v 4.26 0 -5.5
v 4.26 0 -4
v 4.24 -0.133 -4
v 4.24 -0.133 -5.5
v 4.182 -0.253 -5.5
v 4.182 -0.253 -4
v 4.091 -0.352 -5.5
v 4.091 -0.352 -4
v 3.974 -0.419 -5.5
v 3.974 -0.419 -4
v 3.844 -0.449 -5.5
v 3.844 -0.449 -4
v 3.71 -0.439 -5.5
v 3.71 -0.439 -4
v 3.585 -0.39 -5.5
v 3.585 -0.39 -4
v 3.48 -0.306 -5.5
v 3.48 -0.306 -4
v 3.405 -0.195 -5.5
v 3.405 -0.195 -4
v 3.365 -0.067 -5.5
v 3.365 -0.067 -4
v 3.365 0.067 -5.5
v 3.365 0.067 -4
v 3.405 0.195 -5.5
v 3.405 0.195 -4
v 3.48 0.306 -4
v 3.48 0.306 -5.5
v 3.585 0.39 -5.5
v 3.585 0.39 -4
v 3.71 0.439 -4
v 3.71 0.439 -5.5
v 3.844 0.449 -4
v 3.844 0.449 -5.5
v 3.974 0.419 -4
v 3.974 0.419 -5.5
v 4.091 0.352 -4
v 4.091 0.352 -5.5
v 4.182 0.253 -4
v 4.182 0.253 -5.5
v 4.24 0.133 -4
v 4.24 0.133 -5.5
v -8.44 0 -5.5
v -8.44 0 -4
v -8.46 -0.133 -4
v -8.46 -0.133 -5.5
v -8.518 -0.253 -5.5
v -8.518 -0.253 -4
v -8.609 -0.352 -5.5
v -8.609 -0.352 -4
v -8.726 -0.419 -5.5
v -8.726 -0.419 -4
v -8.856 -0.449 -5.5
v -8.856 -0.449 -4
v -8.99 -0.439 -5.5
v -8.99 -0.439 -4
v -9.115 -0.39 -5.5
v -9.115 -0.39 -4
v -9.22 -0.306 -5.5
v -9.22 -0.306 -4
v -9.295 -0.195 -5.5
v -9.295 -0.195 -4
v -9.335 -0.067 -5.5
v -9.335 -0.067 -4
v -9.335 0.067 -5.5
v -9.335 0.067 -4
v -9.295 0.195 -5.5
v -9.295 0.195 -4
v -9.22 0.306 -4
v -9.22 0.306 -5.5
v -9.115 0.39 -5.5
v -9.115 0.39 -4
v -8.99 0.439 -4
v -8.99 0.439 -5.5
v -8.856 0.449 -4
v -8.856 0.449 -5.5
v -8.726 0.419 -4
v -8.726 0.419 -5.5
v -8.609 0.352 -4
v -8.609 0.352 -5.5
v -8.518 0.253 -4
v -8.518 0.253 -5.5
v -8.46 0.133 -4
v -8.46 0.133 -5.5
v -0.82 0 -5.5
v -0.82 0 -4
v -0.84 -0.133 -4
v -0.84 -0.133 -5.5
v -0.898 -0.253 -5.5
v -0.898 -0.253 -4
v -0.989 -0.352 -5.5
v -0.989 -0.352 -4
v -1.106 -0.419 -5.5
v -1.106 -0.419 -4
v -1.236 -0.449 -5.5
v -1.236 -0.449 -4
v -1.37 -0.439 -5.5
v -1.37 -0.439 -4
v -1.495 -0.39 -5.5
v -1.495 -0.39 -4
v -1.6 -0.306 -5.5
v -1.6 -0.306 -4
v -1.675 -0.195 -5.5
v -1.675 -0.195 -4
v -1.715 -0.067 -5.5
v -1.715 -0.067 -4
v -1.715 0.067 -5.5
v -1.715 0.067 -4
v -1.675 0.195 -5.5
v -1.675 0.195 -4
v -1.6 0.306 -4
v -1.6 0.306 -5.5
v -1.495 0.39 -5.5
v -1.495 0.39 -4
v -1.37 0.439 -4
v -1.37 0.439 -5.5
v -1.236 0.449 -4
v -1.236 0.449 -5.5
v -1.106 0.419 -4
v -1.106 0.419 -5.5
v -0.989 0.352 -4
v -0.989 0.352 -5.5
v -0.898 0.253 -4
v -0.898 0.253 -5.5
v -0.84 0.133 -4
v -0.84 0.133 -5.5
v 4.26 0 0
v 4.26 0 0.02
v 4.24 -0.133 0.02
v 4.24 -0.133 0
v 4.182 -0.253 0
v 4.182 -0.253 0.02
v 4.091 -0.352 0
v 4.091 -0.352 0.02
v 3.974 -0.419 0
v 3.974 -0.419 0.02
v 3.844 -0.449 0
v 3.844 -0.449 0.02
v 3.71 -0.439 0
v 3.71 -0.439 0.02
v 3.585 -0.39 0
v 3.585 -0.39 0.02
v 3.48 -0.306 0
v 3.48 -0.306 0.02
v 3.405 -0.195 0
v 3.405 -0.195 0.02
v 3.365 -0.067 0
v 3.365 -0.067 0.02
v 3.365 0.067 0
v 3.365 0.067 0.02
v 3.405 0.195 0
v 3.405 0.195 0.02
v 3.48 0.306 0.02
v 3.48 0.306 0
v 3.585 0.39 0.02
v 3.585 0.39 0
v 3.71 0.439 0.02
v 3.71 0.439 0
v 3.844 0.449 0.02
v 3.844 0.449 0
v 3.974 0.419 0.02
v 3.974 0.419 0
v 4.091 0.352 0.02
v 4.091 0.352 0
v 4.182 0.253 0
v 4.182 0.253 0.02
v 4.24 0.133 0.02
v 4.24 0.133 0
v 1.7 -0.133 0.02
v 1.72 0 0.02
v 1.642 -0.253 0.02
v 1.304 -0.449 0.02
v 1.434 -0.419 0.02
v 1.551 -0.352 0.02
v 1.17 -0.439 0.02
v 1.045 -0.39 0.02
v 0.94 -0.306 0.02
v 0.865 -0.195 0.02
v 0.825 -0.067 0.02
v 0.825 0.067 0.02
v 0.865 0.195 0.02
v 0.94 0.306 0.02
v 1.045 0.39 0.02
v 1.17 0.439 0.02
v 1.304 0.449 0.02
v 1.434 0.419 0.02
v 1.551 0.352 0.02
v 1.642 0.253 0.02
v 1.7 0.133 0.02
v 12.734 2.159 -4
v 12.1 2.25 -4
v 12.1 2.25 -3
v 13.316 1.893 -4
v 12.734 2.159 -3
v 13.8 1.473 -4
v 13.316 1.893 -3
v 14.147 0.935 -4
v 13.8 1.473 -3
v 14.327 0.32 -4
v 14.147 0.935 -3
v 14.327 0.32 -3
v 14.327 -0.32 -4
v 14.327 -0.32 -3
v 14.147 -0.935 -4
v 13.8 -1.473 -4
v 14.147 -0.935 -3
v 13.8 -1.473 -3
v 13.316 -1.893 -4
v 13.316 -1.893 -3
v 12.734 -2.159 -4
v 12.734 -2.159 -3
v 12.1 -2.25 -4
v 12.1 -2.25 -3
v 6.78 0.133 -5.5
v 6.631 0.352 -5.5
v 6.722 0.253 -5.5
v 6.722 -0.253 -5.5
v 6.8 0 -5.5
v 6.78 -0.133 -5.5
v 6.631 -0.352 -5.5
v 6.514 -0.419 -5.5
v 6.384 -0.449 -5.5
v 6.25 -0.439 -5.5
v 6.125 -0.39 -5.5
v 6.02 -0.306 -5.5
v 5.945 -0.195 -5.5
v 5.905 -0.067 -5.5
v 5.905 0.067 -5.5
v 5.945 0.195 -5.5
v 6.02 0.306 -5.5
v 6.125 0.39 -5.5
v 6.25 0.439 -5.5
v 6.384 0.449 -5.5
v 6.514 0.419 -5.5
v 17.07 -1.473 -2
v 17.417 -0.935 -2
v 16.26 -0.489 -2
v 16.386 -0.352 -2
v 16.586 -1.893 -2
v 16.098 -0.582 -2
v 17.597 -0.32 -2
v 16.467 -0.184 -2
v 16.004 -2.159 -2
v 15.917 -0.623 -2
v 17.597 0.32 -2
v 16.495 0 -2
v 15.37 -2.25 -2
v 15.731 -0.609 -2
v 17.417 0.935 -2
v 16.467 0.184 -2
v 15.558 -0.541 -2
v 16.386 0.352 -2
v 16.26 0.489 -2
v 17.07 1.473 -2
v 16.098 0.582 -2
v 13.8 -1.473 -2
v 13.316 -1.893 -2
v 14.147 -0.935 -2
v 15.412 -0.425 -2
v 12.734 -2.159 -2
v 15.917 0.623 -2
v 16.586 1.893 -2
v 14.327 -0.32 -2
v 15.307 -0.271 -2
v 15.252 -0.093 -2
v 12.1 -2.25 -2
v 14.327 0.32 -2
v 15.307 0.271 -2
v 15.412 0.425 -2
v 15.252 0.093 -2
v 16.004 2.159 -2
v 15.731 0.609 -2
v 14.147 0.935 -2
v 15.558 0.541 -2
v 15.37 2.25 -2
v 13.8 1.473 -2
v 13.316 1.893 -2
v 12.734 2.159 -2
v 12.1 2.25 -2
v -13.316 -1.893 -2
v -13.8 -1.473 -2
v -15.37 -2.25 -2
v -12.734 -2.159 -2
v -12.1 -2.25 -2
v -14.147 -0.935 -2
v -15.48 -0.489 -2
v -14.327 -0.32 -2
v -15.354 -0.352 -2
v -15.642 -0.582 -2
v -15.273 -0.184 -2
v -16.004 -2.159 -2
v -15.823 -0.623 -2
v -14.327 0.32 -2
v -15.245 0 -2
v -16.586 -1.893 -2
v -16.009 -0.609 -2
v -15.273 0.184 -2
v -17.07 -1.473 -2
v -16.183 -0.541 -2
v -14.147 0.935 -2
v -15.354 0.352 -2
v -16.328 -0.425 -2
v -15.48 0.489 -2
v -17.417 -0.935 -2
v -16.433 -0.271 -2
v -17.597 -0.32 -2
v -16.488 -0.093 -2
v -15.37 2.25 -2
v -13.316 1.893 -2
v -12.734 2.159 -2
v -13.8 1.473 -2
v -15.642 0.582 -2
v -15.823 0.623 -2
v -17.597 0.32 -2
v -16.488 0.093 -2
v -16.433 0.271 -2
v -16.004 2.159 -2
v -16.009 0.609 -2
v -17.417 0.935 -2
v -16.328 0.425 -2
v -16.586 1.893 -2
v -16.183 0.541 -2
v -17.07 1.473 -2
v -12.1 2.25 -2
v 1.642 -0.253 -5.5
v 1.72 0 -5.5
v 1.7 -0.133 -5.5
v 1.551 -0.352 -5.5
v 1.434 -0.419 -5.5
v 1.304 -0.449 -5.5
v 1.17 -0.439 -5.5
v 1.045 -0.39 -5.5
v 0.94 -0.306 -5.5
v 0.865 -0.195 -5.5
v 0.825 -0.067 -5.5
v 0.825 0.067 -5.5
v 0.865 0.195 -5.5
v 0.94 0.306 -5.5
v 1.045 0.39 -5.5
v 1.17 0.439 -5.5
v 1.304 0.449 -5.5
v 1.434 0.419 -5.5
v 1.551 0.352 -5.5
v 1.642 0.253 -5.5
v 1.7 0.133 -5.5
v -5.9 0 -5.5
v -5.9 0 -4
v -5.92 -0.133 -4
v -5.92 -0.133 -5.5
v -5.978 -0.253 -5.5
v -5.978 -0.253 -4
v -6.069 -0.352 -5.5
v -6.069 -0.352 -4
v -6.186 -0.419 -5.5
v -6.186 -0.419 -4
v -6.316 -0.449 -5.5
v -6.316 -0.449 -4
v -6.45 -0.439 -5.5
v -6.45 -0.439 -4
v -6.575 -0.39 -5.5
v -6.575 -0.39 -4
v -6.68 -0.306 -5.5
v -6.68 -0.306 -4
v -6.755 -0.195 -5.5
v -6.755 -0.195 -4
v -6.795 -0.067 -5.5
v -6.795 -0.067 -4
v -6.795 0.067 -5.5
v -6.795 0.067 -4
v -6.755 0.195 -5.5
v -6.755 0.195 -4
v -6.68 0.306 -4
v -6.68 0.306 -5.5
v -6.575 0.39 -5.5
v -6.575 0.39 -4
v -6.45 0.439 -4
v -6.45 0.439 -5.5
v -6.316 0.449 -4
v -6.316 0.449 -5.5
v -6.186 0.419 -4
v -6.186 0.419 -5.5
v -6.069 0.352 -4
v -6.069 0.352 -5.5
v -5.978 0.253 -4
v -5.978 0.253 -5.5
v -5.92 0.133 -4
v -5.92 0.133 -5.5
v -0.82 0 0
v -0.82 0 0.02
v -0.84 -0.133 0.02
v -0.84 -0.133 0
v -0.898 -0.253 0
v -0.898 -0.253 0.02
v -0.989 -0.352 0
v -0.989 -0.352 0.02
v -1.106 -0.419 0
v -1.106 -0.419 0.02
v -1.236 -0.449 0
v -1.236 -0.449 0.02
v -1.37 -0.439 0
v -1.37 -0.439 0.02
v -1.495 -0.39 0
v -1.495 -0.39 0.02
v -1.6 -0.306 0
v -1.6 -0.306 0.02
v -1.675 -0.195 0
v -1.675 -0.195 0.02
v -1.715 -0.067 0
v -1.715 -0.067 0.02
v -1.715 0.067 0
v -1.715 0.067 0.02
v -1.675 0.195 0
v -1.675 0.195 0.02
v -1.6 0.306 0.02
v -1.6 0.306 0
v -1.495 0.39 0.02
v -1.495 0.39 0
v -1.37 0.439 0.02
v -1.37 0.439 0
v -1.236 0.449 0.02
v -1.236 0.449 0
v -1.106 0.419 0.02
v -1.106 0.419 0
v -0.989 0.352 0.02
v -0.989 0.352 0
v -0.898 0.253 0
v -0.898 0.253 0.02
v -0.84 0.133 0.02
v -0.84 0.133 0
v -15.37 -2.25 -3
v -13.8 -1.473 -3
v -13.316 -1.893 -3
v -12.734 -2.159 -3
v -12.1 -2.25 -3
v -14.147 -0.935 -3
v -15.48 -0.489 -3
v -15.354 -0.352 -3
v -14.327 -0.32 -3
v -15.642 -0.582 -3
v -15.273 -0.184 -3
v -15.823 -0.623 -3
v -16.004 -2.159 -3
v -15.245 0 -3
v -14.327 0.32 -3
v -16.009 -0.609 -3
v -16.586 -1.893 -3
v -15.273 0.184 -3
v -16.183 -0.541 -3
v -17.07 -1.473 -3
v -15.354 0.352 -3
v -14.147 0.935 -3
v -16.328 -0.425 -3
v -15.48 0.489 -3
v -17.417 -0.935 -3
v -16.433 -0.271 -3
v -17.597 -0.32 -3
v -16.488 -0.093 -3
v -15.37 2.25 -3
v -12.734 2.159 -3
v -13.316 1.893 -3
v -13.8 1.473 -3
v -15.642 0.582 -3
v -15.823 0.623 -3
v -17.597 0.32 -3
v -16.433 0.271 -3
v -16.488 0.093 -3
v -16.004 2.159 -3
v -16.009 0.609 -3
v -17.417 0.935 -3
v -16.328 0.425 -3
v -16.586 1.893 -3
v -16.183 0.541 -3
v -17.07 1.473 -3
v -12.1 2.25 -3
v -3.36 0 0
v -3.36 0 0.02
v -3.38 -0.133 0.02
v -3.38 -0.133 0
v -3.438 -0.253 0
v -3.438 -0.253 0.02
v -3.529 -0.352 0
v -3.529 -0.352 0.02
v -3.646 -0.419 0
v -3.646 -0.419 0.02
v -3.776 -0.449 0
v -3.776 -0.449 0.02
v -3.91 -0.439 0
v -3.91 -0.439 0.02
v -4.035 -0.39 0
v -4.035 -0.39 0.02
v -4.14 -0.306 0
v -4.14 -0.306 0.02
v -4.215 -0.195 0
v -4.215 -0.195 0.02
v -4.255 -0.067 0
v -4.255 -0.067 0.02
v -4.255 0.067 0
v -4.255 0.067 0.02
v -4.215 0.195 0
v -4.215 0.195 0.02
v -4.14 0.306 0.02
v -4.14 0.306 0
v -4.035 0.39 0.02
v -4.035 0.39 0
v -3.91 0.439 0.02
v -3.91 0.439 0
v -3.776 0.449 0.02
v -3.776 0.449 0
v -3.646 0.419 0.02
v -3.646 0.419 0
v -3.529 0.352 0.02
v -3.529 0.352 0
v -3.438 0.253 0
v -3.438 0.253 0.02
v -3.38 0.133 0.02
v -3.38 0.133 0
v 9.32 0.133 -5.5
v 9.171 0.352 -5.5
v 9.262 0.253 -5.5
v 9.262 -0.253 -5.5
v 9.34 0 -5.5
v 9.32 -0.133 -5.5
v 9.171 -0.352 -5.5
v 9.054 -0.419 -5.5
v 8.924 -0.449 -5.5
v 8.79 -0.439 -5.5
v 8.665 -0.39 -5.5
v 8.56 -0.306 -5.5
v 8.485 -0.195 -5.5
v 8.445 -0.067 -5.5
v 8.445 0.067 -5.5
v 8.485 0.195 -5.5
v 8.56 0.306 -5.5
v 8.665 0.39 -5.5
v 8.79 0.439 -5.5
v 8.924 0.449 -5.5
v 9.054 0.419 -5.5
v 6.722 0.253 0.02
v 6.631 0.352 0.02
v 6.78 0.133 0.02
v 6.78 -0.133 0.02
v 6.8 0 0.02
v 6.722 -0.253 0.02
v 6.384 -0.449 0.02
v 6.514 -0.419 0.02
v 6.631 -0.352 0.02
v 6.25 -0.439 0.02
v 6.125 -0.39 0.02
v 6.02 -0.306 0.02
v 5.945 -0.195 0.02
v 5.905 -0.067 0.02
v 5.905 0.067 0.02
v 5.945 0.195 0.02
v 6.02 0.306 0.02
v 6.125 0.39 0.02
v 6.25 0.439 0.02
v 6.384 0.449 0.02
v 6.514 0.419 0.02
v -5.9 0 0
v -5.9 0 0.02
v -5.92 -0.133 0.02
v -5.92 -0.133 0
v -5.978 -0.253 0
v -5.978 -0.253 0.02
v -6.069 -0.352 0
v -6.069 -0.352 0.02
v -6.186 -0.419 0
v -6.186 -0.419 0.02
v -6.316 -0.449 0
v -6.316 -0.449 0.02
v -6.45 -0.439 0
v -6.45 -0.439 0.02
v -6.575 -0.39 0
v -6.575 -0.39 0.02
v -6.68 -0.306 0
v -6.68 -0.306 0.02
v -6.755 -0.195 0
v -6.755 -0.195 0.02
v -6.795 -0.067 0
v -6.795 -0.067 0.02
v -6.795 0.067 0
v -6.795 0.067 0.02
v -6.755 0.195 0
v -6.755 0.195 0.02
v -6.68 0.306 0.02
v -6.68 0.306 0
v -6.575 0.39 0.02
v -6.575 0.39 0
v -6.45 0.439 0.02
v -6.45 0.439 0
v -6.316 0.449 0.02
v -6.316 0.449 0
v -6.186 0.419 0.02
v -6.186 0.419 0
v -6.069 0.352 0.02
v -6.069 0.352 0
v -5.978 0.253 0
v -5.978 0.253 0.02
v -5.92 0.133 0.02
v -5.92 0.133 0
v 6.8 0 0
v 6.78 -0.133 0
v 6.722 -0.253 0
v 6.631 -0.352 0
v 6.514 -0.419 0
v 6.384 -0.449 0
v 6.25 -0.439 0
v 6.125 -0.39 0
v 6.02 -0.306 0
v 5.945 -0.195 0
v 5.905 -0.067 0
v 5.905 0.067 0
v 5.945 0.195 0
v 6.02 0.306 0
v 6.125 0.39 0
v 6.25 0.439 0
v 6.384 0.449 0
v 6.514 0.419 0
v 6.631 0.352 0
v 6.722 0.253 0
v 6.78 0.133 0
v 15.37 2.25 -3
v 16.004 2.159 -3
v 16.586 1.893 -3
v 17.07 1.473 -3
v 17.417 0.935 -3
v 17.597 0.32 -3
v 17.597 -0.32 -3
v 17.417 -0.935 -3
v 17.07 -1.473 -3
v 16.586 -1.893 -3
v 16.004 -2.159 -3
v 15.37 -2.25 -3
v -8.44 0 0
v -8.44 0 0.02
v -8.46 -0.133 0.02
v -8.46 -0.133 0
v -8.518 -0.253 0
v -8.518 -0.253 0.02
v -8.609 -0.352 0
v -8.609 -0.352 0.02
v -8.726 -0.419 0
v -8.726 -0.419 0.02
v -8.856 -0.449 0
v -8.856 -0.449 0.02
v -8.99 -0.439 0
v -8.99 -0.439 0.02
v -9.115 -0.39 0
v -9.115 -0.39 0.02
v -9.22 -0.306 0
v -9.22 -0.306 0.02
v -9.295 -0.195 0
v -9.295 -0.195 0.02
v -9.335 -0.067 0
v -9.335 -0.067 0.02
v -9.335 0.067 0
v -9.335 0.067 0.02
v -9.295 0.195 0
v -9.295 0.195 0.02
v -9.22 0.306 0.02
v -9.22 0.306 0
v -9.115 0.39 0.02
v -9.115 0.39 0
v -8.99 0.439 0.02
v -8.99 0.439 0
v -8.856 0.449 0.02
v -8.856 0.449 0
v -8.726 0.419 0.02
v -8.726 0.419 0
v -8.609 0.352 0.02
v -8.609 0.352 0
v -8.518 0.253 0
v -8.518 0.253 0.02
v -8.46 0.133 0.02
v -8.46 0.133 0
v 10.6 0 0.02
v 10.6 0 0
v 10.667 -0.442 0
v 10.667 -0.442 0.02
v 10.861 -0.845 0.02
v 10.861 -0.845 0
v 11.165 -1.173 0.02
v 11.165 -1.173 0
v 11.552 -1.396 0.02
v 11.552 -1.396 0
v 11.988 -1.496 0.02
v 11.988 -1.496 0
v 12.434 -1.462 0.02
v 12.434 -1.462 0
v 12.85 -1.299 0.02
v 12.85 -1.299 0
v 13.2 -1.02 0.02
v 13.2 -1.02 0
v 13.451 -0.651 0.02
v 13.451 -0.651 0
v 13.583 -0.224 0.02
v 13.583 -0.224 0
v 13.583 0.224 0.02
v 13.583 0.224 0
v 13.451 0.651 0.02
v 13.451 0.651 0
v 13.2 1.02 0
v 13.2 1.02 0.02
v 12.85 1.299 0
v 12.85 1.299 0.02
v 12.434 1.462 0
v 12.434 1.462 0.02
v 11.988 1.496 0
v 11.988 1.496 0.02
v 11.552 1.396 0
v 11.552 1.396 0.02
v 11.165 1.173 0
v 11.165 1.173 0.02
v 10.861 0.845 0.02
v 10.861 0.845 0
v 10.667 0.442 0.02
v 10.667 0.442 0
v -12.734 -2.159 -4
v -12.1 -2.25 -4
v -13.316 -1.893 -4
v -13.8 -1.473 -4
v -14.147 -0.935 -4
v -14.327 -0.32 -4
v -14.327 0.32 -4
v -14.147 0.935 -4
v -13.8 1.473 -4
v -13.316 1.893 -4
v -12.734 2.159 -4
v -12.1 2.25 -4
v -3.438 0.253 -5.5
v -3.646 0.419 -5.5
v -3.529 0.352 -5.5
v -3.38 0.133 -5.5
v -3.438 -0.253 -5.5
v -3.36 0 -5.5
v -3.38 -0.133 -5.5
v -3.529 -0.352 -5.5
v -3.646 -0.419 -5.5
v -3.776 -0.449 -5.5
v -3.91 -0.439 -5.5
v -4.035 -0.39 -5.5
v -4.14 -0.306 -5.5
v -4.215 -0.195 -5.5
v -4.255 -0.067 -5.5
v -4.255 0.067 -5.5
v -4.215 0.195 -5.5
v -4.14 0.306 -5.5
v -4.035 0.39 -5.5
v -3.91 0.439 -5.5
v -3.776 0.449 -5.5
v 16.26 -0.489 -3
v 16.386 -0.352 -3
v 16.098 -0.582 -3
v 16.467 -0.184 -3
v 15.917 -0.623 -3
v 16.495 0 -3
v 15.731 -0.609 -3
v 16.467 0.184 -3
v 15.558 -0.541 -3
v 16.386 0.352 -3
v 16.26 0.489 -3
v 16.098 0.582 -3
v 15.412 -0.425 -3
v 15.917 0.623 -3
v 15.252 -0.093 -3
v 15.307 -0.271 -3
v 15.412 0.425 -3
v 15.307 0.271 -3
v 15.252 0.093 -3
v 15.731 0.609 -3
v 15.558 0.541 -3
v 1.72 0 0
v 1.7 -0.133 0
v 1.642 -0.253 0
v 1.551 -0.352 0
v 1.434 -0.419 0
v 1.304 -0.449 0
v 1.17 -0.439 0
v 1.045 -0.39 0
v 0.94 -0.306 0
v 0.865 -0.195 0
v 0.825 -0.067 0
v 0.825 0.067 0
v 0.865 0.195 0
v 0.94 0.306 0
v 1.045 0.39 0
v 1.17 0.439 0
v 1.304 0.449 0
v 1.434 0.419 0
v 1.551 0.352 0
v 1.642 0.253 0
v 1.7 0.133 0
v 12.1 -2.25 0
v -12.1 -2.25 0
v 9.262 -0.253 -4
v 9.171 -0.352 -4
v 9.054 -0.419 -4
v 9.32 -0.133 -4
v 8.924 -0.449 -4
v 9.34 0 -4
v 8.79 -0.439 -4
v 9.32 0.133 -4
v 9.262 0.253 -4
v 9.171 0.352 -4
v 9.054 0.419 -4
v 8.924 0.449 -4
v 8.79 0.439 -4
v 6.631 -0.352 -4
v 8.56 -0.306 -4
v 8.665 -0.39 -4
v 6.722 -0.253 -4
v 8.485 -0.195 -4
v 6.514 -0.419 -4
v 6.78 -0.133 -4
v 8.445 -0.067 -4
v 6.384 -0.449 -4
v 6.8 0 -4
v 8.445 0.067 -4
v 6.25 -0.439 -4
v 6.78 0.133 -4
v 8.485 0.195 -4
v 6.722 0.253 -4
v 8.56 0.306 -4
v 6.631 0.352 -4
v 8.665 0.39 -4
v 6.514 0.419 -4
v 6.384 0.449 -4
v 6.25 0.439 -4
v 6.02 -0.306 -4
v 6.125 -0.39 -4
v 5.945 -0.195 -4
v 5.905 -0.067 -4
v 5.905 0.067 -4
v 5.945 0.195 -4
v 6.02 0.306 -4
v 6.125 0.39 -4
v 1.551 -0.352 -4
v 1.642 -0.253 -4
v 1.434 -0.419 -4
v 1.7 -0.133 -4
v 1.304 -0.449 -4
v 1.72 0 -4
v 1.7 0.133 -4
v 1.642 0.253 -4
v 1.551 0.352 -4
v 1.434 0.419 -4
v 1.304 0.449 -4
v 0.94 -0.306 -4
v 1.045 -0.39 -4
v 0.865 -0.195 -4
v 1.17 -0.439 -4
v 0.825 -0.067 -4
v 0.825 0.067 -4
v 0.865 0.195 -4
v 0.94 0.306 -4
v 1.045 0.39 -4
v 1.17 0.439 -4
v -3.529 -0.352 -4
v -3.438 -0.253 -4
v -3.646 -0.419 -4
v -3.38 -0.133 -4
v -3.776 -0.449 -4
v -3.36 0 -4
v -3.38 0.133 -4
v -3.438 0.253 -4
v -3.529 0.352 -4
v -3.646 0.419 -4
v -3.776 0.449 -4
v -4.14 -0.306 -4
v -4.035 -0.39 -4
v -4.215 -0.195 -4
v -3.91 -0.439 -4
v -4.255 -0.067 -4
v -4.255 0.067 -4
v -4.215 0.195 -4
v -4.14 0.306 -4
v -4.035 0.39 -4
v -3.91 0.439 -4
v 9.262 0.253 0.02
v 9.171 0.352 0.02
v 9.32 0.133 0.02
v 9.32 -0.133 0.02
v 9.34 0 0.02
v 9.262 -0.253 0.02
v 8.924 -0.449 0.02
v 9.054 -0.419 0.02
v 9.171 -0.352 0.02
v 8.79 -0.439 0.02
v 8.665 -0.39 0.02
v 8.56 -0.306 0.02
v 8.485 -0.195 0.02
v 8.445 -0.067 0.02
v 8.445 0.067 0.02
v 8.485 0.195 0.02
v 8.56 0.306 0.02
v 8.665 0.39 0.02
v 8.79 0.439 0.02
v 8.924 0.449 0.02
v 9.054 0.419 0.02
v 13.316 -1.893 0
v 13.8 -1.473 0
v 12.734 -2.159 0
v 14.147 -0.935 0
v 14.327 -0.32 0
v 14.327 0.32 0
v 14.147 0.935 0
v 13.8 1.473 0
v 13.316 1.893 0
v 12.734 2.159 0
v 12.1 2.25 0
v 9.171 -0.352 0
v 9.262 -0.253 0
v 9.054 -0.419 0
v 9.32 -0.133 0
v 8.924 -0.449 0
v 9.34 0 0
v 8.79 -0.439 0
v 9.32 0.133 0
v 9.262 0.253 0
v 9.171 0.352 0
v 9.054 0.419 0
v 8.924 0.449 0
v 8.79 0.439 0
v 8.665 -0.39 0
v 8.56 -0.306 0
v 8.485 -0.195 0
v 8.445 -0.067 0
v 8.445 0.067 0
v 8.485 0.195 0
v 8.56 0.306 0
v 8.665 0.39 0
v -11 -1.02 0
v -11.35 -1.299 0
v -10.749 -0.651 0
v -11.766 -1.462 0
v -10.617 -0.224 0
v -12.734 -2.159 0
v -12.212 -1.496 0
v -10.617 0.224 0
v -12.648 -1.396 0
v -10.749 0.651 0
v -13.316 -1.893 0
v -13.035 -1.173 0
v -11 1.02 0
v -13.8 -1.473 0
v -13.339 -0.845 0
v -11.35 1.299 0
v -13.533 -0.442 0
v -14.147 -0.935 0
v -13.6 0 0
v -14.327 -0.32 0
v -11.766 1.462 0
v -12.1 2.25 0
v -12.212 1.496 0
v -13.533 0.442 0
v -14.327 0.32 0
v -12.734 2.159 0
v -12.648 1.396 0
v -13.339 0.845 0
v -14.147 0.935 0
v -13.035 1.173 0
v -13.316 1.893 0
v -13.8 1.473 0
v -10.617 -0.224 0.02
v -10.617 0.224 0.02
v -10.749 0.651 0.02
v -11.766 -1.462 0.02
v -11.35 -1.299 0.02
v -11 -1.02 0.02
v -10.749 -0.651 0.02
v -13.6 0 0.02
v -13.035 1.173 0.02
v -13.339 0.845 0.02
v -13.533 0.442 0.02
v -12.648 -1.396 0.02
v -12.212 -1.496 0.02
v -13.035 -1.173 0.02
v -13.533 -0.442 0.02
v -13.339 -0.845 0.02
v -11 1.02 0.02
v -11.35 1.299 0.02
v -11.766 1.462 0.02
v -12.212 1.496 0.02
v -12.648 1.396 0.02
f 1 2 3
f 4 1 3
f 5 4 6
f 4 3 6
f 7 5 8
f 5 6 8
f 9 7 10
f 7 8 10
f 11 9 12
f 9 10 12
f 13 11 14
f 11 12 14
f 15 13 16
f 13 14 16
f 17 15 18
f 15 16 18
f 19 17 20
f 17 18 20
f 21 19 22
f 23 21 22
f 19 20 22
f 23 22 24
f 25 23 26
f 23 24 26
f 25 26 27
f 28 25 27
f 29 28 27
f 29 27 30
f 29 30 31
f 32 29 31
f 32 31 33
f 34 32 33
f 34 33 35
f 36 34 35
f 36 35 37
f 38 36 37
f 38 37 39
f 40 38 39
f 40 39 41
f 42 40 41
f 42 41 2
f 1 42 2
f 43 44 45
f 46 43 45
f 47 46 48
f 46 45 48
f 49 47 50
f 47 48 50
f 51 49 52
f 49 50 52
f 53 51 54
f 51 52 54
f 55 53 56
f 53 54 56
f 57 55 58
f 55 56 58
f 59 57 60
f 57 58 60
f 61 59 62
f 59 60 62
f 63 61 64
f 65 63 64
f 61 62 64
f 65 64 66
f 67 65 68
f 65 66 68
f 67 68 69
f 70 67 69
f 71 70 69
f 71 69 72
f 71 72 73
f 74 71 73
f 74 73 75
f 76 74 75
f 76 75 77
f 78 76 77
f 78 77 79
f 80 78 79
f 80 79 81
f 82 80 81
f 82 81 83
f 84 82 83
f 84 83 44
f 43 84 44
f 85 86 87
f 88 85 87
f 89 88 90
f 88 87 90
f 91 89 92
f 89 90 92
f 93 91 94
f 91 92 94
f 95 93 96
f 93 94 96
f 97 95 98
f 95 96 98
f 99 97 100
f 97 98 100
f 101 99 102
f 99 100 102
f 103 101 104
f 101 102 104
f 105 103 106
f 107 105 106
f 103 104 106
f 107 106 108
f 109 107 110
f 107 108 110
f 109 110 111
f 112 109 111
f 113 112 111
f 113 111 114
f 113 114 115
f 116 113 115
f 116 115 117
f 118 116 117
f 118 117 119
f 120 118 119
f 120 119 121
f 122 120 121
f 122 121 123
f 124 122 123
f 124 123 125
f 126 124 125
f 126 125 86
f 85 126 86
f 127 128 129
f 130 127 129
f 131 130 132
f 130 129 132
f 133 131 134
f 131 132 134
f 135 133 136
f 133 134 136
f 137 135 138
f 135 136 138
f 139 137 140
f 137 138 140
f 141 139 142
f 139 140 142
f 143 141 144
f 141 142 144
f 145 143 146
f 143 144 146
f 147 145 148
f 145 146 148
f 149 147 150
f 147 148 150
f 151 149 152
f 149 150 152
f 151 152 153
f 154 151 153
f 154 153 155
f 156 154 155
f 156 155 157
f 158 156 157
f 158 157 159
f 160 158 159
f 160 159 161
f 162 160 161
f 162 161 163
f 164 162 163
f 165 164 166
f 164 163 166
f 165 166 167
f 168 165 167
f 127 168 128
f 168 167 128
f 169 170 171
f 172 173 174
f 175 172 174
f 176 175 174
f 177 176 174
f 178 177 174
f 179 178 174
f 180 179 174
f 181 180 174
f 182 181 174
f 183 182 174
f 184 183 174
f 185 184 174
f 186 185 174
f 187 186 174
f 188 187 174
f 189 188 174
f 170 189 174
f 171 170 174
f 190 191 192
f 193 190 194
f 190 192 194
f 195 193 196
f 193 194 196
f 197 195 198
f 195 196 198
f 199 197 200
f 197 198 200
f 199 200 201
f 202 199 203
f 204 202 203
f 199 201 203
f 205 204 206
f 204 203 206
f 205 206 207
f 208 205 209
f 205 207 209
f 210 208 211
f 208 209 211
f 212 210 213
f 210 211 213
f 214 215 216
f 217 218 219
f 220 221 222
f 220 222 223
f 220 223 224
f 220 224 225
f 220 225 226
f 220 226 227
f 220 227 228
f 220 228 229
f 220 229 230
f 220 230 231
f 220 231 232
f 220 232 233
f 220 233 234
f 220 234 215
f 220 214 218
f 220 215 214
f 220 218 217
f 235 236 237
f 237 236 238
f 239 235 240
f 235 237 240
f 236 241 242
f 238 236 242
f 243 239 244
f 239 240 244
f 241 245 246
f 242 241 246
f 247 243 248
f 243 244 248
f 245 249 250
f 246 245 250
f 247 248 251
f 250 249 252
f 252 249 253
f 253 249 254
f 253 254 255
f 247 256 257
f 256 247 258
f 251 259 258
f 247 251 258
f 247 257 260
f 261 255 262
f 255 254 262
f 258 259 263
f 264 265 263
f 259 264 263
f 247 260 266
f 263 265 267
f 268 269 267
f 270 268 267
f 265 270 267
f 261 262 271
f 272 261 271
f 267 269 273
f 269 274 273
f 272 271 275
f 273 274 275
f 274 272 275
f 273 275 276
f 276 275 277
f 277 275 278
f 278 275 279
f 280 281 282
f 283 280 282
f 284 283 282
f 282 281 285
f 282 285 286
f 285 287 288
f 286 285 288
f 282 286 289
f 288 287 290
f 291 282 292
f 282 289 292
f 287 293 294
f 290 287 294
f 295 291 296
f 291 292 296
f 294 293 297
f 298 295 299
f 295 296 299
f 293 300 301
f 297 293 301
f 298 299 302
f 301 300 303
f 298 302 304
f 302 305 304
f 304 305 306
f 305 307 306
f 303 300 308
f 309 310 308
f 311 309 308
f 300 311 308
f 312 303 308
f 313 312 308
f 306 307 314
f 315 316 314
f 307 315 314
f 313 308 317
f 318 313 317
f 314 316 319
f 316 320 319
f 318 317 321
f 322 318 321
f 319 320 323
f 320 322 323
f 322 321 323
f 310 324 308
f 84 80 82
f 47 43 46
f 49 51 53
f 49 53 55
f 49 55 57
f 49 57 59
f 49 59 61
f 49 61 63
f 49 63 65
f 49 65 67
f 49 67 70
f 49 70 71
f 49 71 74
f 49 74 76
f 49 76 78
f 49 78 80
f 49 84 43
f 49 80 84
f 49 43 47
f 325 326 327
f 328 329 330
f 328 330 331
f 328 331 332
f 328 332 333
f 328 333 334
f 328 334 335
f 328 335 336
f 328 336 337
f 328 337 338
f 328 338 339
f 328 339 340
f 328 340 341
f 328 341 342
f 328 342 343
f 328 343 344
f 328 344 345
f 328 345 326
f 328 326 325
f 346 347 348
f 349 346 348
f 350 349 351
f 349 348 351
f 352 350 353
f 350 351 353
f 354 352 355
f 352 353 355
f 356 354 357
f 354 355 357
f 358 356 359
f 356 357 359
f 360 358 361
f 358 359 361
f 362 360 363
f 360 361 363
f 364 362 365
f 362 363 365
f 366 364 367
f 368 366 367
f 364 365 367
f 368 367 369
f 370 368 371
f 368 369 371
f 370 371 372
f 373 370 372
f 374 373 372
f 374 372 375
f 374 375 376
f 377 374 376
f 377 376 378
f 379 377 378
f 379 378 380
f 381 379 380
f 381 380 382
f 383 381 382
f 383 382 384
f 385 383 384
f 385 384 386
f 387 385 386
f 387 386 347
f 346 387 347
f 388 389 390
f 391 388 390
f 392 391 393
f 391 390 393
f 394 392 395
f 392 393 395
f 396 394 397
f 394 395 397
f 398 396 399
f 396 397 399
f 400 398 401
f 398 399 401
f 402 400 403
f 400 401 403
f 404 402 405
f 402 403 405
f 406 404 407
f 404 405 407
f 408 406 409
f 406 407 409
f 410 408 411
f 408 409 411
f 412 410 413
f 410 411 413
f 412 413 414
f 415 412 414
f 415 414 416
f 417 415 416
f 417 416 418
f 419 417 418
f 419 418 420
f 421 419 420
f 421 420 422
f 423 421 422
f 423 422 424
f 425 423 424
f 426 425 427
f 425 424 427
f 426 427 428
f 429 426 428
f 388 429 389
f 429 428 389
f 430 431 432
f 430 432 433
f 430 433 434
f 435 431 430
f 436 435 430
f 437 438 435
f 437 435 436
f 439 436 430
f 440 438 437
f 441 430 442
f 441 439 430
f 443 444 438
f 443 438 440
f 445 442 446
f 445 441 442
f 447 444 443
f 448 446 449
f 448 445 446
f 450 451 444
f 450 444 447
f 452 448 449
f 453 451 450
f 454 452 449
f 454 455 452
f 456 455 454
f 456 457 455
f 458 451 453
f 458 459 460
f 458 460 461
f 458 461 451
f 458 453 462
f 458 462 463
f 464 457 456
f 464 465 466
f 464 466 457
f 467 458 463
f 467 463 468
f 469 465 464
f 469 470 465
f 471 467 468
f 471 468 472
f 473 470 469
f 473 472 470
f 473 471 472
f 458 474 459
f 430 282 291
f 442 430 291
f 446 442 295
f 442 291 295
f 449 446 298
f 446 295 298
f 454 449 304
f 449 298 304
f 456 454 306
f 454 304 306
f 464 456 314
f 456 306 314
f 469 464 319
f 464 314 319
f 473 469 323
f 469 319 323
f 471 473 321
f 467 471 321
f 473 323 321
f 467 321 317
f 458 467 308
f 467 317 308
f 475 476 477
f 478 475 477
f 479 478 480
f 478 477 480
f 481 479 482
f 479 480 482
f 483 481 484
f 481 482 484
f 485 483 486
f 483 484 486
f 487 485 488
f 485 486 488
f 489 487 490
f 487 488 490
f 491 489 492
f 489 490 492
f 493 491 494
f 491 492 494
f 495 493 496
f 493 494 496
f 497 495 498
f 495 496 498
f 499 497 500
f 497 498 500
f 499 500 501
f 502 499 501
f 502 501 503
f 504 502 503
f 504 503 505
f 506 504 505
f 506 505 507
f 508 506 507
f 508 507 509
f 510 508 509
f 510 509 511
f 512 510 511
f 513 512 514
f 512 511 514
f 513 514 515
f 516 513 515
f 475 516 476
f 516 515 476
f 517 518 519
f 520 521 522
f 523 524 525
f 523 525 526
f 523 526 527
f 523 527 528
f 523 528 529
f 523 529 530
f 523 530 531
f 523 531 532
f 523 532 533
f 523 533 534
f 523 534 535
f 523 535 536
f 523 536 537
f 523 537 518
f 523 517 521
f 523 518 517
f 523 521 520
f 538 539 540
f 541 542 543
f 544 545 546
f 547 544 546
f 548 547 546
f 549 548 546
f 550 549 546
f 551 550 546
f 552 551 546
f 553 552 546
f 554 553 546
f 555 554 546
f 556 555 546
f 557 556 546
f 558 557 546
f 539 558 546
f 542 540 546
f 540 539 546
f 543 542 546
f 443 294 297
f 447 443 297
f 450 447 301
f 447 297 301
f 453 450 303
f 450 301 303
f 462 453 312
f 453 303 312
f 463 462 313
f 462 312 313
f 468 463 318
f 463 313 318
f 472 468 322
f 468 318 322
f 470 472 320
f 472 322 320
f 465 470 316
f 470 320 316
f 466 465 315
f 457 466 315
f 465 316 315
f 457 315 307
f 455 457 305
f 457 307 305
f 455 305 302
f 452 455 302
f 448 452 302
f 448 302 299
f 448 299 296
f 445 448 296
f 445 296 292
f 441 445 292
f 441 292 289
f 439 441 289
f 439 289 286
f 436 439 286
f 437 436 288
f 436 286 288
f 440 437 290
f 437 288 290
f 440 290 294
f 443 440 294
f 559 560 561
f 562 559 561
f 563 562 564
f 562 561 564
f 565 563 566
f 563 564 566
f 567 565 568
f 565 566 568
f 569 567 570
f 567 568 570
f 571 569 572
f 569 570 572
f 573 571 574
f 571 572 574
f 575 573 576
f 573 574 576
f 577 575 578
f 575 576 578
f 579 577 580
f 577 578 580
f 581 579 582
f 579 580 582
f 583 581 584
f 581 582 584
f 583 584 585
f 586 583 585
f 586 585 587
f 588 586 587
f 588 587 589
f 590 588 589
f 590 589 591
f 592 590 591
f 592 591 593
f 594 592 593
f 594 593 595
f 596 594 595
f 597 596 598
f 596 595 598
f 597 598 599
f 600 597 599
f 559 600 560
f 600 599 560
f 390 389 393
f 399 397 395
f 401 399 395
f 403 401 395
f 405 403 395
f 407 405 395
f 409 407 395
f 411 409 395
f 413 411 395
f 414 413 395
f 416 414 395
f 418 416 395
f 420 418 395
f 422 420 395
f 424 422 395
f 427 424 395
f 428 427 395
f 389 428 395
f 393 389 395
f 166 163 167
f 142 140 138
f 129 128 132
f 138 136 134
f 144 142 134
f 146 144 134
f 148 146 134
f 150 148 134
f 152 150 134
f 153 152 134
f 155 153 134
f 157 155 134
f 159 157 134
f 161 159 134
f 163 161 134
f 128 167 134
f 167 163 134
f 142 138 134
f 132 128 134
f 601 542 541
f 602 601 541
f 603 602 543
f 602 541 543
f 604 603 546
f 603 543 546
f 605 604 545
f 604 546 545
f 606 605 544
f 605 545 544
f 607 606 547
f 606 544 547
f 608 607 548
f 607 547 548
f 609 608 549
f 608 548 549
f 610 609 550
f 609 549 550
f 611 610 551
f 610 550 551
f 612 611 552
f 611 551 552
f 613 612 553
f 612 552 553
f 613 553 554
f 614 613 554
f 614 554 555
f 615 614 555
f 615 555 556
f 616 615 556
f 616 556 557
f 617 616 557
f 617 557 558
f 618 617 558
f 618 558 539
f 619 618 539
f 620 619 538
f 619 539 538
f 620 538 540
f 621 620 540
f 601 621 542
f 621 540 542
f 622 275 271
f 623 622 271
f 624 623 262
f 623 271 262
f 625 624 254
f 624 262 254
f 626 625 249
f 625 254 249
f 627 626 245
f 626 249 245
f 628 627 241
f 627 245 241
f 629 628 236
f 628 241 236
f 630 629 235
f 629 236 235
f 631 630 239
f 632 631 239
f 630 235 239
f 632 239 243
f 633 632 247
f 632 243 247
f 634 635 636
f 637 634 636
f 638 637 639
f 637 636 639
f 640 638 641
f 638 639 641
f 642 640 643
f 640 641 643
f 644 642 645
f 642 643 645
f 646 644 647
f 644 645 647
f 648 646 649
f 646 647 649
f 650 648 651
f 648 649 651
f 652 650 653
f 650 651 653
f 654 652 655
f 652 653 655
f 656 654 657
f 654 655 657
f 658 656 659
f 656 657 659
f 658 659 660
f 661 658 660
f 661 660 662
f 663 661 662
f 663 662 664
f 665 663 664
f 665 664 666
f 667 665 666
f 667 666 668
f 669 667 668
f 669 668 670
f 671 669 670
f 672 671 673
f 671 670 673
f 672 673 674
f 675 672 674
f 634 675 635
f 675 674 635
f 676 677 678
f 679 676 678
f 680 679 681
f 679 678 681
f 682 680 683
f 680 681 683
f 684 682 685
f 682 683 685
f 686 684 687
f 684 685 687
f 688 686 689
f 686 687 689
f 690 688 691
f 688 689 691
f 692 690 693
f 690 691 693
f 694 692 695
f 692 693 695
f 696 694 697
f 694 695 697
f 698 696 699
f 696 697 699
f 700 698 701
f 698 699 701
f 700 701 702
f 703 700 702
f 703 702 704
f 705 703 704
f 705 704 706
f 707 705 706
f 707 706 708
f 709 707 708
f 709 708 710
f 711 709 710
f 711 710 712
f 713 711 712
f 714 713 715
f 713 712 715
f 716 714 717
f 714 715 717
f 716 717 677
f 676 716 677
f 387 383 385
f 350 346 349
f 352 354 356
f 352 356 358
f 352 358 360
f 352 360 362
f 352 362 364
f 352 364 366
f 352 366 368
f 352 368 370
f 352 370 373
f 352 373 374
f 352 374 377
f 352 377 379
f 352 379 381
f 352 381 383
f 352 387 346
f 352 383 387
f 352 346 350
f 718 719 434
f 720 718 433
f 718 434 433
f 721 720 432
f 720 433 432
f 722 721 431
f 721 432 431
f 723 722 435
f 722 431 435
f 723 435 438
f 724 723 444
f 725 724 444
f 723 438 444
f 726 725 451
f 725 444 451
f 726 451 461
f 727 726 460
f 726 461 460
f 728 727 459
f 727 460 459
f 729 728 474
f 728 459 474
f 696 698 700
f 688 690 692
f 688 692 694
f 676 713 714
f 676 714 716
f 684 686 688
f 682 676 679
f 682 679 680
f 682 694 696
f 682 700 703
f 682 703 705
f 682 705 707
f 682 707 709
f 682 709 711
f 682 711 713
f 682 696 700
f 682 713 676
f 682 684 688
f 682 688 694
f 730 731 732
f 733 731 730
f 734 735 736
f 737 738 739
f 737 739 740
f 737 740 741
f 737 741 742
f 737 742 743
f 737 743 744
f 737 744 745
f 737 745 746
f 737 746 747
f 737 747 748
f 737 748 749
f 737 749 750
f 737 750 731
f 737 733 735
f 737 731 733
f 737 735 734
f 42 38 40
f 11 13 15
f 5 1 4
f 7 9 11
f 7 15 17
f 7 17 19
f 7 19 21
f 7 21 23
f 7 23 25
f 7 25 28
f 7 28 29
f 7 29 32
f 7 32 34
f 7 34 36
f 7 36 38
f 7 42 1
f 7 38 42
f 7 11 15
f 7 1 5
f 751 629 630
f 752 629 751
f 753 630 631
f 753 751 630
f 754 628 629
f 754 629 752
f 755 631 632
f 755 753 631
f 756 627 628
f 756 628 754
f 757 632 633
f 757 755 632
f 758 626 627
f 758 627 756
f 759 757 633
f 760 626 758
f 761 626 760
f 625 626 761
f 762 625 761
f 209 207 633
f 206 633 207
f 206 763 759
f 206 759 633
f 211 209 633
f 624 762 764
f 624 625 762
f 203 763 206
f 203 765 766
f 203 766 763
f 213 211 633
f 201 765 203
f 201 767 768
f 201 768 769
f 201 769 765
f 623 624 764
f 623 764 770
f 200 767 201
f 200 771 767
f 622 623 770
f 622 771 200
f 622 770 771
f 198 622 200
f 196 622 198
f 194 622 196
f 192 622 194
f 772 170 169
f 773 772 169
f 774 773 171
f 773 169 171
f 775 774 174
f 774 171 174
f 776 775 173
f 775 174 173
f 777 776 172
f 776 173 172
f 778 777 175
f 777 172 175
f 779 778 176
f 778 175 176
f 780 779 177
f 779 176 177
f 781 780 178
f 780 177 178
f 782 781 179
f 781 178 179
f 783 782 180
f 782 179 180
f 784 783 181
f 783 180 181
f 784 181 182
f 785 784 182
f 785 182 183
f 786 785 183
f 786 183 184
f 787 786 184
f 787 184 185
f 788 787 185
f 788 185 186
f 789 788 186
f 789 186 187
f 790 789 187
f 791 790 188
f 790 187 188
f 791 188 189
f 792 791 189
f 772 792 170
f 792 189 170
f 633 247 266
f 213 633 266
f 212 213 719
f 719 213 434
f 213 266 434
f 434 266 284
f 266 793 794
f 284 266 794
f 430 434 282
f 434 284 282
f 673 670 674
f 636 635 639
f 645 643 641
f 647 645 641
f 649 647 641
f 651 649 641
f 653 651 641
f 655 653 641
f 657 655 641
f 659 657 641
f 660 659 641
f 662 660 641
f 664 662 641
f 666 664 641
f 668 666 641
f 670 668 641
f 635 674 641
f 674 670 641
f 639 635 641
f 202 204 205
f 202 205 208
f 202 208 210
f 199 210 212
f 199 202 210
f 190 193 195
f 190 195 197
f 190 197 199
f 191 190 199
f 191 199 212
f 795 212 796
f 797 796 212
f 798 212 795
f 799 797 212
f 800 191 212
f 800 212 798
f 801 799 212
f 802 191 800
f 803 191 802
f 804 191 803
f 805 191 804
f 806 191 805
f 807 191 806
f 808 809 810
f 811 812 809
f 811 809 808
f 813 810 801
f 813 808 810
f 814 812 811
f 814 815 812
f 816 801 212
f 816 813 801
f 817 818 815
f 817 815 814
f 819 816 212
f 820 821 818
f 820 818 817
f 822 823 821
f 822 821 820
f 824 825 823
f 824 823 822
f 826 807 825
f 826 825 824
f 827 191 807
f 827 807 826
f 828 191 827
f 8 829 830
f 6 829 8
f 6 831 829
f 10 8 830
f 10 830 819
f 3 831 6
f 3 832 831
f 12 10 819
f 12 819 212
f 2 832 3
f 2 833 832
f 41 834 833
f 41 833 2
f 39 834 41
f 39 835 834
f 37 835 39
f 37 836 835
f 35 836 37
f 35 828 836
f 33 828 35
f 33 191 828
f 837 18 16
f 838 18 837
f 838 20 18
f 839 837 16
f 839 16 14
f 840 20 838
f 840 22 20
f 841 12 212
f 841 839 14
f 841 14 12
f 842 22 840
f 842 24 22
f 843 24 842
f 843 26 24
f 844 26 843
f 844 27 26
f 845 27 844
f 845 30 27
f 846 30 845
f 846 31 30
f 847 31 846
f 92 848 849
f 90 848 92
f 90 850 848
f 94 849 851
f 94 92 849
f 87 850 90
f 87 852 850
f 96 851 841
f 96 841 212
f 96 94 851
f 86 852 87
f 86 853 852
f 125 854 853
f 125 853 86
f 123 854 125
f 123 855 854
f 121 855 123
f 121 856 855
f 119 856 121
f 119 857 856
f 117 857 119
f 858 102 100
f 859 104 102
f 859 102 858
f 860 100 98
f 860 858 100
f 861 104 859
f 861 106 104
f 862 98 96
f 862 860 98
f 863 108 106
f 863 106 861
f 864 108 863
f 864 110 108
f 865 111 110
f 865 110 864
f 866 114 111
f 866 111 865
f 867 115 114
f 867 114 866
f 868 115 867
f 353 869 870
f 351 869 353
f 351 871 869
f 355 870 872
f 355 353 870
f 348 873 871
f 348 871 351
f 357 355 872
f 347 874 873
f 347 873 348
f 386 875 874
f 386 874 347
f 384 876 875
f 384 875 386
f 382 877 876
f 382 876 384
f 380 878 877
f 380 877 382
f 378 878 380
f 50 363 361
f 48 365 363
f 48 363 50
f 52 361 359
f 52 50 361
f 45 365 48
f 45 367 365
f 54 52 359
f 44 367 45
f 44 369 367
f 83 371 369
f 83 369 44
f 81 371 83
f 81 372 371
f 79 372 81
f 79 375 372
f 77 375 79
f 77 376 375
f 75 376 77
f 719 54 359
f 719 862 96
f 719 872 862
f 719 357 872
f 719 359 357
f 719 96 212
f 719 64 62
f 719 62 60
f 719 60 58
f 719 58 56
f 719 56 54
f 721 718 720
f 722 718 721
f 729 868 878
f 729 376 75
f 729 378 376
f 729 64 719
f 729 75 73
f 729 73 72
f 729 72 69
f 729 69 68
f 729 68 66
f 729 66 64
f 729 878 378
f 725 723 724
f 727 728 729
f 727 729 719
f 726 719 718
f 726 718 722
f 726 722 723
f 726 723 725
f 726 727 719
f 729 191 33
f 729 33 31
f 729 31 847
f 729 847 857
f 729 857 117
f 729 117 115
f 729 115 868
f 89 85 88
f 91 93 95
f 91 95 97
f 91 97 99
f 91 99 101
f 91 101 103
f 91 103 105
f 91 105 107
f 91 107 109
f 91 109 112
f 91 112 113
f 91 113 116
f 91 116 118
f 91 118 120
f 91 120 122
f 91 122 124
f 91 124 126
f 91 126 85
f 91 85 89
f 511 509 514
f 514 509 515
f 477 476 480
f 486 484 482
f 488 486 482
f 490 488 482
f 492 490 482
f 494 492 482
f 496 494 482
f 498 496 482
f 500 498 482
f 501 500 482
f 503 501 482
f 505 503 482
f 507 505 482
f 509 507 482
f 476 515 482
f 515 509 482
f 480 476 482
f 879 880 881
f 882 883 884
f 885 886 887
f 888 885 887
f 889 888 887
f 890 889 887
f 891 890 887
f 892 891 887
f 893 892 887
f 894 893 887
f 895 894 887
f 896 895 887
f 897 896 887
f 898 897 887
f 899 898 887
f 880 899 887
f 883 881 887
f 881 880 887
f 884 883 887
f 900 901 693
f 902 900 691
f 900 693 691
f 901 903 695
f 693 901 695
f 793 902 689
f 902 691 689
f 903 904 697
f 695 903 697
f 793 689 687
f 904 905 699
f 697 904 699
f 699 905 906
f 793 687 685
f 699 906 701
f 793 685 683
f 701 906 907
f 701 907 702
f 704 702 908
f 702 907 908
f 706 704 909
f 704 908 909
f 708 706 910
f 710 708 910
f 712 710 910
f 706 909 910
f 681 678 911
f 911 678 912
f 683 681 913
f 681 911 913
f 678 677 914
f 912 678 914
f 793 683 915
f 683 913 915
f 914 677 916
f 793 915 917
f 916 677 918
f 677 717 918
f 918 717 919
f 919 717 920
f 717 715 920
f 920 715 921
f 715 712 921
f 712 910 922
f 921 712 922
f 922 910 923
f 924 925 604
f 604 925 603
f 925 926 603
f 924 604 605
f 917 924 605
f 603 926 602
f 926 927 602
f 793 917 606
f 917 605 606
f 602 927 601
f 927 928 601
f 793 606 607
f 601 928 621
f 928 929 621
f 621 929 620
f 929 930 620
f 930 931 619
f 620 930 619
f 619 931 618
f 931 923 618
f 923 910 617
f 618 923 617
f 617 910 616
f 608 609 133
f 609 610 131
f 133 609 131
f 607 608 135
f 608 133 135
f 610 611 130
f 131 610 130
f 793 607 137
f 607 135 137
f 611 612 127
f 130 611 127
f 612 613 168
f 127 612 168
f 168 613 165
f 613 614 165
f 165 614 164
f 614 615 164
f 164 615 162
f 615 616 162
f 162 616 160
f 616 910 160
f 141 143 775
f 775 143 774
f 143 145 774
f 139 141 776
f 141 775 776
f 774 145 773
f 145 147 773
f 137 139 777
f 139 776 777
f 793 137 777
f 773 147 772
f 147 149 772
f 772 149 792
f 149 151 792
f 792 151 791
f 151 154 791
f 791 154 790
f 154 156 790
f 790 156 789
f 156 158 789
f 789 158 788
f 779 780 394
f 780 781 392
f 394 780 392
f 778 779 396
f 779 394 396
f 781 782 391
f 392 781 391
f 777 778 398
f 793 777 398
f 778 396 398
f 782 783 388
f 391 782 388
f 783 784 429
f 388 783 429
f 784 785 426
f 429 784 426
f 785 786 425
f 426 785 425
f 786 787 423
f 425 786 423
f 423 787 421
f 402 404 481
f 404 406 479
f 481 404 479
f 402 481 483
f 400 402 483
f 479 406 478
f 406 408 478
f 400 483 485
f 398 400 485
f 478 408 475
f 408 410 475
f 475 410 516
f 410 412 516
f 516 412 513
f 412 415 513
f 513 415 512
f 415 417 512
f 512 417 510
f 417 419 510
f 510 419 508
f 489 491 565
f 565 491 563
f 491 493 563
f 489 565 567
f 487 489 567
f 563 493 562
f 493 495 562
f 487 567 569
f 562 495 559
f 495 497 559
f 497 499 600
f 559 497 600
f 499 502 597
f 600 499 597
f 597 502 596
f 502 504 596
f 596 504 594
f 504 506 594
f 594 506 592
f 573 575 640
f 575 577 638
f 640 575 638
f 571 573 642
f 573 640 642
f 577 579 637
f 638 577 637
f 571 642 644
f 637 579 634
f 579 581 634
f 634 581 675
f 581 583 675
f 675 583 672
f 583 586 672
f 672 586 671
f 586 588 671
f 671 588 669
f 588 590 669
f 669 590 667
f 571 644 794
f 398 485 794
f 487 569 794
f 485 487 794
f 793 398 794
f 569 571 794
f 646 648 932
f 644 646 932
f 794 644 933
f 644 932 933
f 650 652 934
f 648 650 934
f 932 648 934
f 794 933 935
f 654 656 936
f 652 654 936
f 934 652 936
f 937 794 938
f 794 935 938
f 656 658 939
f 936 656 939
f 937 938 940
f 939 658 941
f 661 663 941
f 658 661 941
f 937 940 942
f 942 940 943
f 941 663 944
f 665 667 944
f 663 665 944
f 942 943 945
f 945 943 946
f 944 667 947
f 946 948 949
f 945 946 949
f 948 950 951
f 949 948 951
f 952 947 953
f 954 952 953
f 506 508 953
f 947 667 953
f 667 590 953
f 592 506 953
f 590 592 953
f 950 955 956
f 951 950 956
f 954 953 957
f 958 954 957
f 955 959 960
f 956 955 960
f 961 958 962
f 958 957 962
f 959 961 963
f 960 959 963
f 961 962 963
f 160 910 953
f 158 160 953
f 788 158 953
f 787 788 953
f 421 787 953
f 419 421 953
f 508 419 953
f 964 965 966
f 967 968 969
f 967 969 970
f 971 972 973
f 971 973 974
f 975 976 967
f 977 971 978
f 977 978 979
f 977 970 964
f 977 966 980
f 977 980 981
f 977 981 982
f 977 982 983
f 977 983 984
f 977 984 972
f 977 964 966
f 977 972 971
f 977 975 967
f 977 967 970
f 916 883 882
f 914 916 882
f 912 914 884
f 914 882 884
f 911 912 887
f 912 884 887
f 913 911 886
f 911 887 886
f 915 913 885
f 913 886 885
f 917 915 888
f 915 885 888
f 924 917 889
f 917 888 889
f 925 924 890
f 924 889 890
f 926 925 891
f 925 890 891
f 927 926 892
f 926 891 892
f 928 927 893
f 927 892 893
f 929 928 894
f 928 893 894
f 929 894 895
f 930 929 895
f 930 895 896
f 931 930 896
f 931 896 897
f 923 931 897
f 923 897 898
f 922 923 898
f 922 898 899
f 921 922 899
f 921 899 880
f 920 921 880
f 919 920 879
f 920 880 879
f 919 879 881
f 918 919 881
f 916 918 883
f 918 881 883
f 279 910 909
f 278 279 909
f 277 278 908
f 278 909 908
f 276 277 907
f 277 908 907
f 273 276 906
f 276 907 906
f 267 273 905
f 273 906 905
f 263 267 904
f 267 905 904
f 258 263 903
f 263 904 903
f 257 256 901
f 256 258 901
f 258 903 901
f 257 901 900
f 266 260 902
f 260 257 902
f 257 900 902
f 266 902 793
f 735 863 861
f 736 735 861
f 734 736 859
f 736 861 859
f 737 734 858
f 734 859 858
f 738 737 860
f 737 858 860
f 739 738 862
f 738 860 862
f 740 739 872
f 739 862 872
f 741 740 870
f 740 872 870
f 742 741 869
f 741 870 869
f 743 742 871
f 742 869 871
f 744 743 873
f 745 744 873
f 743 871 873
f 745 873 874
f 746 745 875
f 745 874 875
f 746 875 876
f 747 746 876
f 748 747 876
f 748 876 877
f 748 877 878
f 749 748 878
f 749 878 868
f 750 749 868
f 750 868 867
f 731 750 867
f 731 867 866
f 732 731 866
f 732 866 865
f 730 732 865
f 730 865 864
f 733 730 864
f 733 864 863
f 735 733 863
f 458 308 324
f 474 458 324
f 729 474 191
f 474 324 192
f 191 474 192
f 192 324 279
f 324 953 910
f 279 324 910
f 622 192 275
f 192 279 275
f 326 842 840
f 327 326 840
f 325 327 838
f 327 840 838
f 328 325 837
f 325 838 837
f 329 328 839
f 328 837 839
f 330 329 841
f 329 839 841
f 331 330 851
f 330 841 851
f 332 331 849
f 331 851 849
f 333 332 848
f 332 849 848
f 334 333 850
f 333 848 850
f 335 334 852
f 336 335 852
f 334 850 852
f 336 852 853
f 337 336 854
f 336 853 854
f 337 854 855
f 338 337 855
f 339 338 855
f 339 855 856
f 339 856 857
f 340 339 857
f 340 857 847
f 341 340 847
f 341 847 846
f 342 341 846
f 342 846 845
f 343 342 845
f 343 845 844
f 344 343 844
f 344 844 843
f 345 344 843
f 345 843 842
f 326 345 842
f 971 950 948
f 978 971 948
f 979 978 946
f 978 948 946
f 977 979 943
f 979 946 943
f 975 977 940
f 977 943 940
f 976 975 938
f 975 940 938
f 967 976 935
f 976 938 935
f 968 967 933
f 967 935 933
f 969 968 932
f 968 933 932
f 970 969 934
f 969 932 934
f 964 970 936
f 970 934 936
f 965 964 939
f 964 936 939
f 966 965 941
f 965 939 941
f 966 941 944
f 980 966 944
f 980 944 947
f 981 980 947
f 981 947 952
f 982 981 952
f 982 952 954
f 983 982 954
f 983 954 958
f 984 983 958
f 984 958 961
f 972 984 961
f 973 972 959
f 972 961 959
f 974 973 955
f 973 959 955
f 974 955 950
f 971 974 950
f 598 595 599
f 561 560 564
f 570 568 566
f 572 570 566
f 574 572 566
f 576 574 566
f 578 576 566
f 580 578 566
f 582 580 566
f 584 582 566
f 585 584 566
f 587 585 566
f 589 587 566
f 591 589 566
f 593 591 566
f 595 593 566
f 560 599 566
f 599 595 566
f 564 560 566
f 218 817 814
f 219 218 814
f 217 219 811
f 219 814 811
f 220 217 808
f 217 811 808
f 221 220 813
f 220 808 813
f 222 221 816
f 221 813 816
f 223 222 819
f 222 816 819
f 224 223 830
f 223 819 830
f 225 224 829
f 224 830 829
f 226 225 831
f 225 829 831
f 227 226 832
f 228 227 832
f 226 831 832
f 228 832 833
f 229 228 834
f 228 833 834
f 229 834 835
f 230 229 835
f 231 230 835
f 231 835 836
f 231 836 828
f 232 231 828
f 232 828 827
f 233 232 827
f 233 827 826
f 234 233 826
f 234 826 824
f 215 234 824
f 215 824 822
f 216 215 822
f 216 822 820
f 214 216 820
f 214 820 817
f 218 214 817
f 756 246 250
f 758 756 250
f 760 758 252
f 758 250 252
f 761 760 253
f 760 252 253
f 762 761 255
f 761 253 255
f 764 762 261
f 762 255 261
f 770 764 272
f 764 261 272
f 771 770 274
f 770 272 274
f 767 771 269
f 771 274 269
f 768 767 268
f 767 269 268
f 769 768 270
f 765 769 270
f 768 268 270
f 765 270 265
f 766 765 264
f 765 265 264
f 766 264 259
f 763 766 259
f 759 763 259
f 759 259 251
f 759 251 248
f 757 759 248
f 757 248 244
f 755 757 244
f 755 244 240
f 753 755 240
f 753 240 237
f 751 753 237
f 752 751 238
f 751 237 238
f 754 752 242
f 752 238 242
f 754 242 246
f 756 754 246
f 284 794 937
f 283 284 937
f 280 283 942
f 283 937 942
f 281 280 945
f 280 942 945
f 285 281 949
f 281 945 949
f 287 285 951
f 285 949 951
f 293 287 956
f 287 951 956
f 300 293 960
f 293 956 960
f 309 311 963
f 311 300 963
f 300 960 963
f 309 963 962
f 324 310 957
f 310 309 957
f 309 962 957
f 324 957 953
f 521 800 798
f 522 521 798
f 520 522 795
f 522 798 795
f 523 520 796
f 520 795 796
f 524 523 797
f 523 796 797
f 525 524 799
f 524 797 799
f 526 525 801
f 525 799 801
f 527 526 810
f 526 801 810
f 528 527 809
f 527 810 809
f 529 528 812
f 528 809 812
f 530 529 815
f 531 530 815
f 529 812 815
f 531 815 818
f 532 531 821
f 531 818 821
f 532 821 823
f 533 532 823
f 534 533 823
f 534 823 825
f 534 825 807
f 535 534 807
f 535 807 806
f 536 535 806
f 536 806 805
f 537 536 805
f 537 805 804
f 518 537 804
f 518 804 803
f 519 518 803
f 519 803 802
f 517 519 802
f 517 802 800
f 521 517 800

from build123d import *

# Parameters (mm, degrees)
EXTRUDE_1_DEPTH      = 4
EXTRUDE_START        = -2
SKETCH_2_3_R         = 0.625
EXTRUDE_2_DEPTH      = 1
EXTRUDE_3_DEPTH      = 1.5
EXTRUDE_3_DEPTH_BACK = 4.02
SKETCH_4_R           = 0.45
SKETCH_5_R           = 1.5
EXTRUDE_4_DEPTH      = 0.02


with BuildPart() as part:
    # 草图2 → 凸台-拉伸1 (new body)
    with BuildSketch(Plane.XY):
        with BuildLine():
            Line((-12.1, 2.25), (12.1, 2.25))
            ThreePointArc((12.1, 2.25), (14.35, 0), (12.1, -2.25))
            Line((12.1, -2.25), (-12.1, -2.25))
            ThreePointArc((-12.1, -2.25), (-14.35, 0), (-12.1, 2.25))
        make_face()
    extrude(amount=-EXTRUDE_1_DEPTH)

    # 草图2<3> → 凸台-拉伸2 (add)
    with BuildSketch(Plane.XY.offset(EXTRUDE_START)):
        with BuildLine():
            Line((-15.37, 2.25), (15.37, 2.25))
            ThreePointArc((15.37, 2.25), (17.62, 0), (15.37, -2.25))
            Line((15.37, -2.25), (-15.37, -2.25))
            ThreePointArc((-15.37, -2.25), (-17.62, 0), (-15.37, 2.25))
        make_face()
        with Locations((-15.87, 0)):
            Circle(SKETCH_2_3_R, mode=Mode.SUBTRACT)
        with Locations((15.87, 0)):
            Circle(SKETCH_2_3_R, mode=Mode.SUBTRACT)
    extrude(amount=-EXTRUDE_2_DEPTH)

    # 草图4 → 凸台-拉伸3 (add, two sides: drawn at the far end of the back side and taken through both)
    with BuildSketch(Plane(origin=(0, 0, -4), x_dir=(-1, 0, 0), z_dir=(0, 0, -1)).offset(-EXTRUDE_3_DEPTH_BACK)):
        with Locations(Location((-8.89, 0, 0), (0, 0, 180))):
            Circle(SKETCH_4_R)
        with Locations(Location((-6.35, 0, 0), (0, 0, 180))):
            Circle(SKETCH_4_R)
        with Locations(Location((-3.81, 0, 0), (0, 0, 180))):
            Circle(SKETCH_4_R)
        with Locations(Location((-1.27, 0, 0), (0, 0, 180))):
            Circle(SKETCH_4_R)
        with Locations(Location((1.27, 0, 0), (0, 0, 180))):
            Circle(SKETCH_4_R)
        with Locations(Location((3.81, 0, 0), (0, 0, 180))):
            Circle(SKETCH_4_R)
        with Locations(Location((6.35, 0, 0), (0, 0, 180))):
            Circle(SKETCH_4_R)
        with Locations(Location((8.89, 0, 0), (0, 0, 180))):
            Circle(SKETCH_4_R)
    extrude(amount=EXTRUDE_3_DEPTH + EXTRUDE_3_DEPTH_BACK)

    # 草图5 → 凸台-拉伸4 (add)
    with BuildSketch(Plane.XY):
        with Locations(Location((-12.1, 0, 0), (0, 0, 180))):
            Circle(SKETCH_5_R)
        with Locations(Location((12.1, 0, 0), (0, 0, 180))):
            Circle(SKETCH_5_R)
    extrude(amount=EXTRUDE_4_DEPTH)


solid = part.part
